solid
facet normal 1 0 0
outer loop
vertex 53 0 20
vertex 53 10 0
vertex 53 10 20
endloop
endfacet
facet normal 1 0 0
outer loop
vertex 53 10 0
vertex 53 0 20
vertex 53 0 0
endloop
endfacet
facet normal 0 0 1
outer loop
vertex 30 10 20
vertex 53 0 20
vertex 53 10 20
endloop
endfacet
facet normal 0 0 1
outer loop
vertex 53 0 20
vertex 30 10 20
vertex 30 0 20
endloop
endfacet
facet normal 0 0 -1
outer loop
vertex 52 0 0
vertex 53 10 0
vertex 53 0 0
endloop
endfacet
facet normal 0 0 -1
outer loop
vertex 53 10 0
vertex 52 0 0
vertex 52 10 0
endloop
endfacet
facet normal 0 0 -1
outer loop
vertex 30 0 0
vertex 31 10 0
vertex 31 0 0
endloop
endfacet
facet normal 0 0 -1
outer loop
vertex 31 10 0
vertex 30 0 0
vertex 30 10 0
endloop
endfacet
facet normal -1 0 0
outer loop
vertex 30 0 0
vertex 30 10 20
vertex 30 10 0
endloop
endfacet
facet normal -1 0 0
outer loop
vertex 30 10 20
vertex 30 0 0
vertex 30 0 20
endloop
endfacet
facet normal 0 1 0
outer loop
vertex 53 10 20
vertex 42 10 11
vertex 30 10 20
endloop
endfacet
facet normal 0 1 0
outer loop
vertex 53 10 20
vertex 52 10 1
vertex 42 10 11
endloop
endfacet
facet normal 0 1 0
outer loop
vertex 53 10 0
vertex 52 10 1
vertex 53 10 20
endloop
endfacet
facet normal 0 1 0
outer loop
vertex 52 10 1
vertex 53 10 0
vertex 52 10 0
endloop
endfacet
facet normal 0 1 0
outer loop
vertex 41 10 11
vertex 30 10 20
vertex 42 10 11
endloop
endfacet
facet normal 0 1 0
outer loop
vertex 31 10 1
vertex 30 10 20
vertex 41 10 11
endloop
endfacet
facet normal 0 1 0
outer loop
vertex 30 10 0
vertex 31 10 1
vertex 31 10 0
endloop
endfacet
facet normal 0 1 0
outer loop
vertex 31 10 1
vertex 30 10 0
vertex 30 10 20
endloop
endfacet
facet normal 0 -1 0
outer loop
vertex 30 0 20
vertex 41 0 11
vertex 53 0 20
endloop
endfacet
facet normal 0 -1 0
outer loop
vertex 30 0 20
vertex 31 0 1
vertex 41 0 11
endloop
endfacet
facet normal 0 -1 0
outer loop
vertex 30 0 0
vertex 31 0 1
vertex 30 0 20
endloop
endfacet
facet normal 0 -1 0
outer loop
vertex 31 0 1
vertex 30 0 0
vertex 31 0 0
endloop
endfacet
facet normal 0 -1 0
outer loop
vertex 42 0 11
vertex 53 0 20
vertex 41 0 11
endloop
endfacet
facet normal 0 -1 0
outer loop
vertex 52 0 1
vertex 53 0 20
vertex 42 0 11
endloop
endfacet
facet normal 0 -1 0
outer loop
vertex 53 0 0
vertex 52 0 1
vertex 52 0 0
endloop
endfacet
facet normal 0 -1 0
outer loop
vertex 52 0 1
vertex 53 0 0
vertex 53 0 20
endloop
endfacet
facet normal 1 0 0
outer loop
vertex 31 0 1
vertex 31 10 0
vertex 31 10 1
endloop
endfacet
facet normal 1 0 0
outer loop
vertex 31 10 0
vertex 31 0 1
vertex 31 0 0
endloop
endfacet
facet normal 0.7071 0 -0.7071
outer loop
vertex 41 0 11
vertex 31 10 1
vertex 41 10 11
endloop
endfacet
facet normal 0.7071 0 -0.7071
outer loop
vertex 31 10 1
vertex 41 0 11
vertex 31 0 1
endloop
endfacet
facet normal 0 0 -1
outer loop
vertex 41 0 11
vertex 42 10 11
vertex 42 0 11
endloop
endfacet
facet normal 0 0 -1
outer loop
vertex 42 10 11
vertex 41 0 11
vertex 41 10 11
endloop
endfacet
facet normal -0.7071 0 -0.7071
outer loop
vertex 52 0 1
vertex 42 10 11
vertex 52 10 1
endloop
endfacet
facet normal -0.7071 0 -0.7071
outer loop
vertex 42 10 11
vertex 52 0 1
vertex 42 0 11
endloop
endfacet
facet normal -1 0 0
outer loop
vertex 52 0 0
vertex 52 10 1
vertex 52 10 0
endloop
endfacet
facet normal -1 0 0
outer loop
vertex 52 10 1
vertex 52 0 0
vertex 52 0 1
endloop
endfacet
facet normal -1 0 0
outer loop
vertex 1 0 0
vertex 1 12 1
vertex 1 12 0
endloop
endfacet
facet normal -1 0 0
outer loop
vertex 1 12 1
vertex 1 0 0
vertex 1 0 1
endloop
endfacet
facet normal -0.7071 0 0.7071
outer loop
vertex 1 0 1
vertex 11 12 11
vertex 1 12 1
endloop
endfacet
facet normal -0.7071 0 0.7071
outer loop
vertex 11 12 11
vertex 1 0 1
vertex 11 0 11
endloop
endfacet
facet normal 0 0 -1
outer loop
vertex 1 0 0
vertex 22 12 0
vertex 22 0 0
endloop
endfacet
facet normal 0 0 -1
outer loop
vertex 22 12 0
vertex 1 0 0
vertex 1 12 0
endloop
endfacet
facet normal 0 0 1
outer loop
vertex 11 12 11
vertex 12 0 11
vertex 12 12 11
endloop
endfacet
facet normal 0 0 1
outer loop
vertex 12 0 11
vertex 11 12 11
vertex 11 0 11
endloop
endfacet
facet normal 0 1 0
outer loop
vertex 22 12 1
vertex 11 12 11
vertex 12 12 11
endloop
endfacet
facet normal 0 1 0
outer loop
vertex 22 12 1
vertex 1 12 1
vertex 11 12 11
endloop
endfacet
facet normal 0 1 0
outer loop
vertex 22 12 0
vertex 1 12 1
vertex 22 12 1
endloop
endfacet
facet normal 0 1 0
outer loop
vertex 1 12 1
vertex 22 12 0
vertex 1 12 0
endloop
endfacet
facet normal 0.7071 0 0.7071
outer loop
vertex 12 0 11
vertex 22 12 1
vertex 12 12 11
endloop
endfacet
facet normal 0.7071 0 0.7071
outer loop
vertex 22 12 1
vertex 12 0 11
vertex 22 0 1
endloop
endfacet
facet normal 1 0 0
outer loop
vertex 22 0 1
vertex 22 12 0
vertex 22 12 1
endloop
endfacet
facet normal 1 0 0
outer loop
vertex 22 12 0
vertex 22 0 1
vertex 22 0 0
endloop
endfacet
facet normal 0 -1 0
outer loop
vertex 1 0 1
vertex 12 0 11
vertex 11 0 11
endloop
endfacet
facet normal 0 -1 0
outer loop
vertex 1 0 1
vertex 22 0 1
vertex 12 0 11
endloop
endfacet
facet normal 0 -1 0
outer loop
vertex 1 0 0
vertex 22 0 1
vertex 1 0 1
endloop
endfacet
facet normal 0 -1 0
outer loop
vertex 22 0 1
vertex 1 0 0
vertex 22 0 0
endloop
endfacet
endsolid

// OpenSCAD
top = 10;
left = 10;
right = 10;
width = 1;
thickness = 10;
height_offset = 10;

module dove_tail(top, left, right, width, thickness){
    translate([right, 0, 0]){
        hull(){
            translate([0, 0, 0]){
                translate([left + width, 0, 0]){
                    cube(width);
                }
                translate([right * -1 + width, 0, 0]){
                    cube(width);
                }
                translate([width, 0, top]){
                    cube(width);
                }
            }
            translate([0, thickness, 0]){
                translate([left + width, width, 0]){
                    cube(width);
                }
                translate([right * -1 + width, width, 0]){
                    cube(width);
                }
                translate([width, width, top]){
                    cube(width);
                }
            }
        }
    }
}
module dove_tail_negative(top, left, right, width, thickness, height_offset){
    length_percent = 1;
    length = left + right + width + width + width;
    height = top + height_offset;
    difference(){
        translate([0, 0, 0]){
            cube([length * length_percent, thickness, height]);
        }
        translate([length - length, 0, 0]){
            dove_tail(top, left, right, width, thickness);
        }
    }
}

dove_tail(top, left, right, width, thickness);
translate([left + right + 10, 0, 0 ]){
    dove_tail_negative(top, left, right, width, thickness, height_offset);
}
